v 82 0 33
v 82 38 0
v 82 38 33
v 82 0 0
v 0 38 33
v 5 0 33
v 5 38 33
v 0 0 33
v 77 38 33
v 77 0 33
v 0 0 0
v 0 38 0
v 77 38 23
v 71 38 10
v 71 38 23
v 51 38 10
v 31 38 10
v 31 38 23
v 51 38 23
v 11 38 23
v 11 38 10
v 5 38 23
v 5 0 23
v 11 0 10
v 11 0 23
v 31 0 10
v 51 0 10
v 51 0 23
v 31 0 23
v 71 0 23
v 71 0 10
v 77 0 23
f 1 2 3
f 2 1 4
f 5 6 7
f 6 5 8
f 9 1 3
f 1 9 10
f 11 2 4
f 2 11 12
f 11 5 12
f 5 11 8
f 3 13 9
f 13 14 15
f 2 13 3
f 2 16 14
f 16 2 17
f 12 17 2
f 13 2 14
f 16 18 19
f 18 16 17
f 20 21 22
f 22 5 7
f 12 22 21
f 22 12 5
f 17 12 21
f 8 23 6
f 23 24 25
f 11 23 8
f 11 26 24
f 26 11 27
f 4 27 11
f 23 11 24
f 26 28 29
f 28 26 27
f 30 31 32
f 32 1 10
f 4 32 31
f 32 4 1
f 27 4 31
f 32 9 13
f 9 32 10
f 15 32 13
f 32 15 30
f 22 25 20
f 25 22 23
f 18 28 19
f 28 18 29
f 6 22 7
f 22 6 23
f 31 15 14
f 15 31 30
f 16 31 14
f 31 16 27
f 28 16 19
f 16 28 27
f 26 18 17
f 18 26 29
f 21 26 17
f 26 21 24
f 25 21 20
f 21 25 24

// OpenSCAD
led_h = 13;
led_w = 20;
led_l = 96;

frame_w = 72;
frame_l = 401;
frame_h = 289;
frame_into = 10;
frame_gap = 38;
cushion = 5;
base_h = led_h + 2*cushion + frame_into;

module led(){
	cube([led_w,led_l,led_h]);
}

module bottom_frame(){
	difference(){
		cube([frame_w+2*cushion,cushion+frame_l/2,base_h]);
		translate([cushion,cushion,base_h-frame_into])
		cube([frame_w,frame_l/2,frame_into]);

		translate([(frame_w+2*cushion)/2+0.5*led_w,
			cushion+60,
			base_h-frame_into-led_h])
		led();
		translate([(frame_w+2*cushion)/2-1.5*led_w,
			cushion+60,
			base_h-frame_into-led_h])
		led();
	}
}

module side_frame(){
	difference(){
		cube([frame_w+2*cushion,frame_h-2*frame_into,base_h]);
		translate([cushion,0,base_h-frame_into])
		cube([frame_w,frame_h-2*frame_into,frame_into]);

		translate([(frame_w+2*cushion)/2+0.5*led_w,
			cushion+20,
			base_h-frame_into-led_h])
		led();
		translate([(frame_w+2*cushion)/2-1.5*led_w,
			cushion+20,
			base_h-frame_into-led_h])
		led();
		translate([(frame_w+2*cushion)/2+0.5*led_w,
			cushion+40 + led_l,
			base_h-frame_into-led_h])
		led();
		translate([(frame_w+2*cushion)/2-1.5*led_w,
			cushion+40 + led_l,
			base_h-frame_into-led_h])
		led();

	}
}

module top_frame(){
	difference(){
		cube([frame_w+2*cushion,cushion+frame_l/2,base_h]);
		translate([cushion,cushion,base_h-frame_into])
		cube([frame_w,frame_l/2,frame_into]);

		translate([(frame_w+2*cushion)/2+0.5*led_w,
			cushion+frame_l/2 - led_l,
			base_h-frame_into-led_h])
		led();
		translate([(frame_w+2*cushion)/2-1.5*led_w,
			cushion+frame_l/2 - led_l,
			base_h-frame_into-led_h])
		led();
	}
}

module gap(){
	difference(){
		cube([frame_w+2*cushion,frame_gap,base_h]);
		translate([cushion,0,base_h-frame_into])
		cube([frame_w,frame_gap,frame_into]);

		translate([(frame_w+2*cushion)/2+0.5*led_w,
			0,
			base_h-frame_into-led_h])
		led();
		translate([(frame_w+2*cushion)/2-1.5*led_w,
			0,
			base_h-frame_into-led_h])
		led();

	}
}


//bottom_frame();
//side_frame();
//top_frame();
gap();
